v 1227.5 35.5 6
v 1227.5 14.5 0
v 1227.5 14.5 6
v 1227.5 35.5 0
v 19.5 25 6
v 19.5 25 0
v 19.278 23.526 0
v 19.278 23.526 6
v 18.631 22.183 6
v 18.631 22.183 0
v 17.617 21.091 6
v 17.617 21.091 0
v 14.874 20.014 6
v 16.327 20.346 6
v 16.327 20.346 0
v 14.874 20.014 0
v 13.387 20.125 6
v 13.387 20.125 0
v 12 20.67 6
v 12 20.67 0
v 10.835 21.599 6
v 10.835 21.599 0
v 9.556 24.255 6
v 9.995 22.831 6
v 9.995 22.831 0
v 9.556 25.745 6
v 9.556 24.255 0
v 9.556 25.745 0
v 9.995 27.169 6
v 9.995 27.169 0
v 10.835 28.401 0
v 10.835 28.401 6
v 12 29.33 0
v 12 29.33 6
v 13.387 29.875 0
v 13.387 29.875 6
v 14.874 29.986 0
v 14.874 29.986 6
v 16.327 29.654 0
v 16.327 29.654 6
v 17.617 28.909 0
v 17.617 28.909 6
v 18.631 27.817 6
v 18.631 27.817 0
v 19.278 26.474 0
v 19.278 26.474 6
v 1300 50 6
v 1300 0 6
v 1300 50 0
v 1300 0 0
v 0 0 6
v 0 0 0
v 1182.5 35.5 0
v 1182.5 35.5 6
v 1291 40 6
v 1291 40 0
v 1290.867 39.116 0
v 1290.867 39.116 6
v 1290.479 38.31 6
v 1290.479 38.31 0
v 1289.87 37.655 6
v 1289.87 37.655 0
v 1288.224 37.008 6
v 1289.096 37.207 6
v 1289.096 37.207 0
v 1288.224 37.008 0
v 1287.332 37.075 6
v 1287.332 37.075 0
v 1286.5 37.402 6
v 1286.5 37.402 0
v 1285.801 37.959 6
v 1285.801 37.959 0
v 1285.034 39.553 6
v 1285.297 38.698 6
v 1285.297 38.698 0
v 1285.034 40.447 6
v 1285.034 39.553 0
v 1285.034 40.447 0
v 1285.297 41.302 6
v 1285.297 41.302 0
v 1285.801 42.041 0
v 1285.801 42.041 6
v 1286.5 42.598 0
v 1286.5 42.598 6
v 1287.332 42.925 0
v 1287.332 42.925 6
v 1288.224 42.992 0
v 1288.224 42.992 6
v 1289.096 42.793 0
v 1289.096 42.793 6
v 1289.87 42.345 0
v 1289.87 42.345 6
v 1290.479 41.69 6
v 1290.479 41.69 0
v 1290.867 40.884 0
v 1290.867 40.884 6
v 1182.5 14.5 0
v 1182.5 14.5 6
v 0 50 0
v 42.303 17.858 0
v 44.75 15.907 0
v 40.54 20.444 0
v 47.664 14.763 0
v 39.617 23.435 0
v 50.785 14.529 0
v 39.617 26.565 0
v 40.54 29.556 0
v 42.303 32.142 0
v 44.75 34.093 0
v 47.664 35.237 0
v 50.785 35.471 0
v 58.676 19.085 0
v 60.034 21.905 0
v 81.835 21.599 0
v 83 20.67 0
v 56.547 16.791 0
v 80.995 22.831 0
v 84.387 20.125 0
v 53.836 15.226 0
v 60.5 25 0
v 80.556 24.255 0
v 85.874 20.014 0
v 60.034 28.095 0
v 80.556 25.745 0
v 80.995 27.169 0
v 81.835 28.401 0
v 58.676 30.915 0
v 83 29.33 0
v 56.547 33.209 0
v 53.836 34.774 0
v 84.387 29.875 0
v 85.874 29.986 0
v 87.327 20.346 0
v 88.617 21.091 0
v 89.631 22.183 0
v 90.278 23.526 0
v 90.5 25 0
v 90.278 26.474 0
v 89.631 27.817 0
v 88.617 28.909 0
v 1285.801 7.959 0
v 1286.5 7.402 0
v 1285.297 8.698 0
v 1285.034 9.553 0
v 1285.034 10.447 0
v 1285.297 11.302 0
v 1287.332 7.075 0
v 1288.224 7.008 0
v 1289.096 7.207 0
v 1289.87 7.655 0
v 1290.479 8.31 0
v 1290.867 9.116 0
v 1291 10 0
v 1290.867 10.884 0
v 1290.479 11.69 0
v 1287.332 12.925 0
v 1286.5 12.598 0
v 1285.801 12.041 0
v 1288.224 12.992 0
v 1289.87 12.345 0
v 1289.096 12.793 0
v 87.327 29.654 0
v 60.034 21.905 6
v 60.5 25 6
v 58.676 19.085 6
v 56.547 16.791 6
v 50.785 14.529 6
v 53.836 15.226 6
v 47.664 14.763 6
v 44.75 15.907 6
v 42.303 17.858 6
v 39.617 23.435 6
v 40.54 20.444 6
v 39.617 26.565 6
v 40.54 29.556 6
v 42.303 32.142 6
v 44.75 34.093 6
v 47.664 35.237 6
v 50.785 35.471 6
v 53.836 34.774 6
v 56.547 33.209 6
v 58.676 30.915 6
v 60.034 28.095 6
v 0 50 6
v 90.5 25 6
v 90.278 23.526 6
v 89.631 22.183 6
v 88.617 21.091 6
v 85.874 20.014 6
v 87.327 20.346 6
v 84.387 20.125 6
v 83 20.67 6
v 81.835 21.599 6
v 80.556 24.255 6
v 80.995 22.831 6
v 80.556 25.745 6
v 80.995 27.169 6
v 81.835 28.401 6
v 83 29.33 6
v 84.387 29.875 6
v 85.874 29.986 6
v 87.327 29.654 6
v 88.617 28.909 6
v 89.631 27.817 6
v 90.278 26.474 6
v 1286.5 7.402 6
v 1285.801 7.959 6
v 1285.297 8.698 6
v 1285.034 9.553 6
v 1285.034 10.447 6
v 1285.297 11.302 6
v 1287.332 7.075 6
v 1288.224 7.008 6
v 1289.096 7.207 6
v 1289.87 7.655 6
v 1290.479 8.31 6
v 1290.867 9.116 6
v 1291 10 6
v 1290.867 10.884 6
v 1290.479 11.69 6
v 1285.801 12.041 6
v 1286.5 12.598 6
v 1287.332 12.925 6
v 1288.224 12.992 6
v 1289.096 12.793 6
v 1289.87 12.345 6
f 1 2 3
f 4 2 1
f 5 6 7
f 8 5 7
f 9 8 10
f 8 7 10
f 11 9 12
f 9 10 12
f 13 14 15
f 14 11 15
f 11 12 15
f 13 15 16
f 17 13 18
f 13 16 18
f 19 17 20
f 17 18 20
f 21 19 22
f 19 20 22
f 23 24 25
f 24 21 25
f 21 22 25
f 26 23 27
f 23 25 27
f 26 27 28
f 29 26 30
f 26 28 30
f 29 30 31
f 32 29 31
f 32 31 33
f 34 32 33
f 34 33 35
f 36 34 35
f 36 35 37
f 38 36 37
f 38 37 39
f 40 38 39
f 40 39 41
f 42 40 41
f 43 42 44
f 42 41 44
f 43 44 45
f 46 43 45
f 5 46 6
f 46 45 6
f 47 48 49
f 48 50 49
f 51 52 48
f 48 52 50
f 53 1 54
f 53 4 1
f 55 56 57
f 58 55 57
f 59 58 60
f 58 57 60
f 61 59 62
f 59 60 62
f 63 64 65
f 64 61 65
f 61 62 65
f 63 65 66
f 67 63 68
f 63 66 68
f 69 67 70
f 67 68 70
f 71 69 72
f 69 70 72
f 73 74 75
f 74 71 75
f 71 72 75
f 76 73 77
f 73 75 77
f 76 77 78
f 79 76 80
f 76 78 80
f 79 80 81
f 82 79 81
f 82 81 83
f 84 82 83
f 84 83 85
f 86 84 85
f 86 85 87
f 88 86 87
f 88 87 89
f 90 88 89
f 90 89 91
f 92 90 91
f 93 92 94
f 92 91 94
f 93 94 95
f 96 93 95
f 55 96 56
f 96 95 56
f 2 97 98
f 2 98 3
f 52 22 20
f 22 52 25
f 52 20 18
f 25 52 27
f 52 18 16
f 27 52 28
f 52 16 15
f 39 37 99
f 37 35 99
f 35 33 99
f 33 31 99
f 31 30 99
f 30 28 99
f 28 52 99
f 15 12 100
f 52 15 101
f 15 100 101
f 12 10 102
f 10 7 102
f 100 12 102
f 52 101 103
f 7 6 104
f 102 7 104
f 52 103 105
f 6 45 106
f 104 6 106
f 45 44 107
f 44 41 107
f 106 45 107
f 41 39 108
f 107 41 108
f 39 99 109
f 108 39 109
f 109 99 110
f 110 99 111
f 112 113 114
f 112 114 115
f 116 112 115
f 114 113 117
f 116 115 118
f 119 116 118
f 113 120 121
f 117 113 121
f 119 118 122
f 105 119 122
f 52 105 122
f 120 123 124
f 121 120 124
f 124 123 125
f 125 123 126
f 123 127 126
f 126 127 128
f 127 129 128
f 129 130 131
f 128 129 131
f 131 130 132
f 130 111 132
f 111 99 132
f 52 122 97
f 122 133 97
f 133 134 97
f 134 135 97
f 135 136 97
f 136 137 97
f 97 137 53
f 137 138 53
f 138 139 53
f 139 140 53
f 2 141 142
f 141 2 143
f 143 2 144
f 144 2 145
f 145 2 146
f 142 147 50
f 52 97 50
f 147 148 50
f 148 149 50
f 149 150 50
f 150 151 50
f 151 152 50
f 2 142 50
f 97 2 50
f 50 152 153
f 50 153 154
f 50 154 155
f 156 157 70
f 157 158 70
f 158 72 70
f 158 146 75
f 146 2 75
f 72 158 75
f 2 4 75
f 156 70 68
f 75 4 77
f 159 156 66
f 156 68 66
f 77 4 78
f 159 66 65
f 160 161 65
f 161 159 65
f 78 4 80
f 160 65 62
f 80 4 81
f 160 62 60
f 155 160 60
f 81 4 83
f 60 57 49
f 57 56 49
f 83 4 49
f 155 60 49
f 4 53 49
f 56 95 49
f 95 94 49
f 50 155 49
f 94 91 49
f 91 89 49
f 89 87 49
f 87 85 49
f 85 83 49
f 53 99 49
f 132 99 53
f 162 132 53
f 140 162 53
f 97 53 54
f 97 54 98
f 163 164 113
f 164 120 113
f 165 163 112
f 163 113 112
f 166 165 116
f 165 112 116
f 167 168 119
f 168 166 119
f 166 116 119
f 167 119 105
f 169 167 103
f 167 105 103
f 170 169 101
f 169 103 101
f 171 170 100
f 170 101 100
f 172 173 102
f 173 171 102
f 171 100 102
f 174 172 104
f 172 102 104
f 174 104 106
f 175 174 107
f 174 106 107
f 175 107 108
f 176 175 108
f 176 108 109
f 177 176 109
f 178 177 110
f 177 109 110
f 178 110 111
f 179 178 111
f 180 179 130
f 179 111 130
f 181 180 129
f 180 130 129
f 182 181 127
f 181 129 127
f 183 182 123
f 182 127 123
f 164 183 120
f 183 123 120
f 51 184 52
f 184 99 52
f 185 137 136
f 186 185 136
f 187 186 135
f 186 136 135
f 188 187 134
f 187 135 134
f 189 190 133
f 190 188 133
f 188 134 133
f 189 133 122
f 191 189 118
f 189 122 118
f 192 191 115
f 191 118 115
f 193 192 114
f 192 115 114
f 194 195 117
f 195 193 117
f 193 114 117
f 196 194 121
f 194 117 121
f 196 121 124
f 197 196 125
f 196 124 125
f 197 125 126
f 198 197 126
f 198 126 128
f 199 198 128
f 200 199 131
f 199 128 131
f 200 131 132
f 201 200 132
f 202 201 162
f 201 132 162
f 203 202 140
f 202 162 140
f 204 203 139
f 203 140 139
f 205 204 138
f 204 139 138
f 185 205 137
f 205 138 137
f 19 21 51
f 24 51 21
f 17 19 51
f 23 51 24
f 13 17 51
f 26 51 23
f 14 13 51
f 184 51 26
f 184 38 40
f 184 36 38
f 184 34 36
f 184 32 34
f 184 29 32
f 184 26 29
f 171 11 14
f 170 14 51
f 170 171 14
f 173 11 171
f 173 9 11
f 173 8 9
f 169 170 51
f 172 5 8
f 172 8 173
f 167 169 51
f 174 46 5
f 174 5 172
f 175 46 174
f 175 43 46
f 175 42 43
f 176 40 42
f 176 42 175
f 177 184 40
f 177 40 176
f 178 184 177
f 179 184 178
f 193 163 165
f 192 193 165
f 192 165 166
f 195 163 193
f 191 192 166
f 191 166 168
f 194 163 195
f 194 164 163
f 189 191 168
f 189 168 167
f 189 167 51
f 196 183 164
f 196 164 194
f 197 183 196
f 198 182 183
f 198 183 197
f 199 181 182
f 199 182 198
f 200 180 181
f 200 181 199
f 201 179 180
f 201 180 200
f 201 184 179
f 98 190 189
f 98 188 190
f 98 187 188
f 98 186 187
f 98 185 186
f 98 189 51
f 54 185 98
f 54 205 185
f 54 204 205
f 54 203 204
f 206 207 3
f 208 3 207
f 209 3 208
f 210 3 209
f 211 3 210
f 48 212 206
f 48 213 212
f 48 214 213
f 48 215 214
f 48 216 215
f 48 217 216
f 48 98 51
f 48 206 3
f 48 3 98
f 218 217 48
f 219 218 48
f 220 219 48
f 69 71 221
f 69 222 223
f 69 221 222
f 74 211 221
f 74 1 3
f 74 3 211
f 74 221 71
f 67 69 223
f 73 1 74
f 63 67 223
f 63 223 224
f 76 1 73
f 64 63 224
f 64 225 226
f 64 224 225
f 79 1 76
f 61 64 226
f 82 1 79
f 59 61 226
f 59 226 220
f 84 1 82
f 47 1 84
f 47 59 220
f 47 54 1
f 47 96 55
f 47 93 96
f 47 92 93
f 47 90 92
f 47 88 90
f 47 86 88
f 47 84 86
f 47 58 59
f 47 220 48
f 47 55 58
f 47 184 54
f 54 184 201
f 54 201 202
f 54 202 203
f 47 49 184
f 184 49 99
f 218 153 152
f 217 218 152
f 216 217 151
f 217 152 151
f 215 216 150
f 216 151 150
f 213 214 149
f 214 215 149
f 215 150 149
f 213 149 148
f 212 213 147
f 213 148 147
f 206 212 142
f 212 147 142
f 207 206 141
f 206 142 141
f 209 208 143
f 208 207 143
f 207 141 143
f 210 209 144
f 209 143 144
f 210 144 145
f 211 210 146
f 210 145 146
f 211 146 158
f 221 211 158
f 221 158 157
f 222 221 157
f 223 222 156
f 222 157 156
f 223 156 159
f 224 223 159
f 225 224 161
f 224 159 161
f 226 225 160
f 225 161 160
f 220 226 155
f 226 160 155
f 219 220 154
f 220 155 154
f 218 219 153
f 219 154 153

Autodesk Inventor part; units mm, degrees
ref_plane "YZ Plane" through (0, 0, 0) normal (1, 0, 0) x (0, 1, 0)
ref_plane "XZ Plane" through (0, 0, 0) normal (0, 1, 0) x (-1, 0, 0)
ref_plane "XY Plane" through (0, 0, 0) normal (0, 0, 1) x (1, 0, 0)
sketch "Sketch1" plane through (0, 0, 0) normal (0, 0, 1) x (1, 0, 0)
  line L0 (0, 0) -> (1300, 0)
  line L1 (1300, 0) -> (1300, 50)
  line L2 (1300, 50) -> (0, 50)
  line L3 (0, 50) -> (0, 0)
  circle A0 centre (50, 25) radius 10.5
  circle A1 centre (1288, 40) radius 3
  circle A2 centre (1288, 10) radius 3
  line L4 (1182.5, 14.5) -> (1227.5, 14.5)
  line L5 (1227.5, 14.5) -> (1227.5, 35.5)
  line L6 (1227.5, 35.5) -> (1182.5, 35.5)
  line L7 (1182.5, 35.5) -> (1182.5, 14.5)
  circle A3 centre (14.5, 25) radius 5
  circle A4 centre (85.5, 25) radius 5
  dimension "d0" = 1300
  dimension "d1" = 50
  dimension "d2" = 21
  dimension "d3" = 6
  dimension "d4" = 6
  dimension "d5" = 45
  dimension "d6" = 21
  dimension "d7" = 14.5
  dimension "d8" = 72.5
  dimension "d13" = 10
  dimension "d14" = 10
extrude "Extrusion2" add sketch "Sketch1" along normal blind 6
equation "\"d7\" = -0.5 * d6 + 0.5 * d1"
properties part number "convyerwall2"
